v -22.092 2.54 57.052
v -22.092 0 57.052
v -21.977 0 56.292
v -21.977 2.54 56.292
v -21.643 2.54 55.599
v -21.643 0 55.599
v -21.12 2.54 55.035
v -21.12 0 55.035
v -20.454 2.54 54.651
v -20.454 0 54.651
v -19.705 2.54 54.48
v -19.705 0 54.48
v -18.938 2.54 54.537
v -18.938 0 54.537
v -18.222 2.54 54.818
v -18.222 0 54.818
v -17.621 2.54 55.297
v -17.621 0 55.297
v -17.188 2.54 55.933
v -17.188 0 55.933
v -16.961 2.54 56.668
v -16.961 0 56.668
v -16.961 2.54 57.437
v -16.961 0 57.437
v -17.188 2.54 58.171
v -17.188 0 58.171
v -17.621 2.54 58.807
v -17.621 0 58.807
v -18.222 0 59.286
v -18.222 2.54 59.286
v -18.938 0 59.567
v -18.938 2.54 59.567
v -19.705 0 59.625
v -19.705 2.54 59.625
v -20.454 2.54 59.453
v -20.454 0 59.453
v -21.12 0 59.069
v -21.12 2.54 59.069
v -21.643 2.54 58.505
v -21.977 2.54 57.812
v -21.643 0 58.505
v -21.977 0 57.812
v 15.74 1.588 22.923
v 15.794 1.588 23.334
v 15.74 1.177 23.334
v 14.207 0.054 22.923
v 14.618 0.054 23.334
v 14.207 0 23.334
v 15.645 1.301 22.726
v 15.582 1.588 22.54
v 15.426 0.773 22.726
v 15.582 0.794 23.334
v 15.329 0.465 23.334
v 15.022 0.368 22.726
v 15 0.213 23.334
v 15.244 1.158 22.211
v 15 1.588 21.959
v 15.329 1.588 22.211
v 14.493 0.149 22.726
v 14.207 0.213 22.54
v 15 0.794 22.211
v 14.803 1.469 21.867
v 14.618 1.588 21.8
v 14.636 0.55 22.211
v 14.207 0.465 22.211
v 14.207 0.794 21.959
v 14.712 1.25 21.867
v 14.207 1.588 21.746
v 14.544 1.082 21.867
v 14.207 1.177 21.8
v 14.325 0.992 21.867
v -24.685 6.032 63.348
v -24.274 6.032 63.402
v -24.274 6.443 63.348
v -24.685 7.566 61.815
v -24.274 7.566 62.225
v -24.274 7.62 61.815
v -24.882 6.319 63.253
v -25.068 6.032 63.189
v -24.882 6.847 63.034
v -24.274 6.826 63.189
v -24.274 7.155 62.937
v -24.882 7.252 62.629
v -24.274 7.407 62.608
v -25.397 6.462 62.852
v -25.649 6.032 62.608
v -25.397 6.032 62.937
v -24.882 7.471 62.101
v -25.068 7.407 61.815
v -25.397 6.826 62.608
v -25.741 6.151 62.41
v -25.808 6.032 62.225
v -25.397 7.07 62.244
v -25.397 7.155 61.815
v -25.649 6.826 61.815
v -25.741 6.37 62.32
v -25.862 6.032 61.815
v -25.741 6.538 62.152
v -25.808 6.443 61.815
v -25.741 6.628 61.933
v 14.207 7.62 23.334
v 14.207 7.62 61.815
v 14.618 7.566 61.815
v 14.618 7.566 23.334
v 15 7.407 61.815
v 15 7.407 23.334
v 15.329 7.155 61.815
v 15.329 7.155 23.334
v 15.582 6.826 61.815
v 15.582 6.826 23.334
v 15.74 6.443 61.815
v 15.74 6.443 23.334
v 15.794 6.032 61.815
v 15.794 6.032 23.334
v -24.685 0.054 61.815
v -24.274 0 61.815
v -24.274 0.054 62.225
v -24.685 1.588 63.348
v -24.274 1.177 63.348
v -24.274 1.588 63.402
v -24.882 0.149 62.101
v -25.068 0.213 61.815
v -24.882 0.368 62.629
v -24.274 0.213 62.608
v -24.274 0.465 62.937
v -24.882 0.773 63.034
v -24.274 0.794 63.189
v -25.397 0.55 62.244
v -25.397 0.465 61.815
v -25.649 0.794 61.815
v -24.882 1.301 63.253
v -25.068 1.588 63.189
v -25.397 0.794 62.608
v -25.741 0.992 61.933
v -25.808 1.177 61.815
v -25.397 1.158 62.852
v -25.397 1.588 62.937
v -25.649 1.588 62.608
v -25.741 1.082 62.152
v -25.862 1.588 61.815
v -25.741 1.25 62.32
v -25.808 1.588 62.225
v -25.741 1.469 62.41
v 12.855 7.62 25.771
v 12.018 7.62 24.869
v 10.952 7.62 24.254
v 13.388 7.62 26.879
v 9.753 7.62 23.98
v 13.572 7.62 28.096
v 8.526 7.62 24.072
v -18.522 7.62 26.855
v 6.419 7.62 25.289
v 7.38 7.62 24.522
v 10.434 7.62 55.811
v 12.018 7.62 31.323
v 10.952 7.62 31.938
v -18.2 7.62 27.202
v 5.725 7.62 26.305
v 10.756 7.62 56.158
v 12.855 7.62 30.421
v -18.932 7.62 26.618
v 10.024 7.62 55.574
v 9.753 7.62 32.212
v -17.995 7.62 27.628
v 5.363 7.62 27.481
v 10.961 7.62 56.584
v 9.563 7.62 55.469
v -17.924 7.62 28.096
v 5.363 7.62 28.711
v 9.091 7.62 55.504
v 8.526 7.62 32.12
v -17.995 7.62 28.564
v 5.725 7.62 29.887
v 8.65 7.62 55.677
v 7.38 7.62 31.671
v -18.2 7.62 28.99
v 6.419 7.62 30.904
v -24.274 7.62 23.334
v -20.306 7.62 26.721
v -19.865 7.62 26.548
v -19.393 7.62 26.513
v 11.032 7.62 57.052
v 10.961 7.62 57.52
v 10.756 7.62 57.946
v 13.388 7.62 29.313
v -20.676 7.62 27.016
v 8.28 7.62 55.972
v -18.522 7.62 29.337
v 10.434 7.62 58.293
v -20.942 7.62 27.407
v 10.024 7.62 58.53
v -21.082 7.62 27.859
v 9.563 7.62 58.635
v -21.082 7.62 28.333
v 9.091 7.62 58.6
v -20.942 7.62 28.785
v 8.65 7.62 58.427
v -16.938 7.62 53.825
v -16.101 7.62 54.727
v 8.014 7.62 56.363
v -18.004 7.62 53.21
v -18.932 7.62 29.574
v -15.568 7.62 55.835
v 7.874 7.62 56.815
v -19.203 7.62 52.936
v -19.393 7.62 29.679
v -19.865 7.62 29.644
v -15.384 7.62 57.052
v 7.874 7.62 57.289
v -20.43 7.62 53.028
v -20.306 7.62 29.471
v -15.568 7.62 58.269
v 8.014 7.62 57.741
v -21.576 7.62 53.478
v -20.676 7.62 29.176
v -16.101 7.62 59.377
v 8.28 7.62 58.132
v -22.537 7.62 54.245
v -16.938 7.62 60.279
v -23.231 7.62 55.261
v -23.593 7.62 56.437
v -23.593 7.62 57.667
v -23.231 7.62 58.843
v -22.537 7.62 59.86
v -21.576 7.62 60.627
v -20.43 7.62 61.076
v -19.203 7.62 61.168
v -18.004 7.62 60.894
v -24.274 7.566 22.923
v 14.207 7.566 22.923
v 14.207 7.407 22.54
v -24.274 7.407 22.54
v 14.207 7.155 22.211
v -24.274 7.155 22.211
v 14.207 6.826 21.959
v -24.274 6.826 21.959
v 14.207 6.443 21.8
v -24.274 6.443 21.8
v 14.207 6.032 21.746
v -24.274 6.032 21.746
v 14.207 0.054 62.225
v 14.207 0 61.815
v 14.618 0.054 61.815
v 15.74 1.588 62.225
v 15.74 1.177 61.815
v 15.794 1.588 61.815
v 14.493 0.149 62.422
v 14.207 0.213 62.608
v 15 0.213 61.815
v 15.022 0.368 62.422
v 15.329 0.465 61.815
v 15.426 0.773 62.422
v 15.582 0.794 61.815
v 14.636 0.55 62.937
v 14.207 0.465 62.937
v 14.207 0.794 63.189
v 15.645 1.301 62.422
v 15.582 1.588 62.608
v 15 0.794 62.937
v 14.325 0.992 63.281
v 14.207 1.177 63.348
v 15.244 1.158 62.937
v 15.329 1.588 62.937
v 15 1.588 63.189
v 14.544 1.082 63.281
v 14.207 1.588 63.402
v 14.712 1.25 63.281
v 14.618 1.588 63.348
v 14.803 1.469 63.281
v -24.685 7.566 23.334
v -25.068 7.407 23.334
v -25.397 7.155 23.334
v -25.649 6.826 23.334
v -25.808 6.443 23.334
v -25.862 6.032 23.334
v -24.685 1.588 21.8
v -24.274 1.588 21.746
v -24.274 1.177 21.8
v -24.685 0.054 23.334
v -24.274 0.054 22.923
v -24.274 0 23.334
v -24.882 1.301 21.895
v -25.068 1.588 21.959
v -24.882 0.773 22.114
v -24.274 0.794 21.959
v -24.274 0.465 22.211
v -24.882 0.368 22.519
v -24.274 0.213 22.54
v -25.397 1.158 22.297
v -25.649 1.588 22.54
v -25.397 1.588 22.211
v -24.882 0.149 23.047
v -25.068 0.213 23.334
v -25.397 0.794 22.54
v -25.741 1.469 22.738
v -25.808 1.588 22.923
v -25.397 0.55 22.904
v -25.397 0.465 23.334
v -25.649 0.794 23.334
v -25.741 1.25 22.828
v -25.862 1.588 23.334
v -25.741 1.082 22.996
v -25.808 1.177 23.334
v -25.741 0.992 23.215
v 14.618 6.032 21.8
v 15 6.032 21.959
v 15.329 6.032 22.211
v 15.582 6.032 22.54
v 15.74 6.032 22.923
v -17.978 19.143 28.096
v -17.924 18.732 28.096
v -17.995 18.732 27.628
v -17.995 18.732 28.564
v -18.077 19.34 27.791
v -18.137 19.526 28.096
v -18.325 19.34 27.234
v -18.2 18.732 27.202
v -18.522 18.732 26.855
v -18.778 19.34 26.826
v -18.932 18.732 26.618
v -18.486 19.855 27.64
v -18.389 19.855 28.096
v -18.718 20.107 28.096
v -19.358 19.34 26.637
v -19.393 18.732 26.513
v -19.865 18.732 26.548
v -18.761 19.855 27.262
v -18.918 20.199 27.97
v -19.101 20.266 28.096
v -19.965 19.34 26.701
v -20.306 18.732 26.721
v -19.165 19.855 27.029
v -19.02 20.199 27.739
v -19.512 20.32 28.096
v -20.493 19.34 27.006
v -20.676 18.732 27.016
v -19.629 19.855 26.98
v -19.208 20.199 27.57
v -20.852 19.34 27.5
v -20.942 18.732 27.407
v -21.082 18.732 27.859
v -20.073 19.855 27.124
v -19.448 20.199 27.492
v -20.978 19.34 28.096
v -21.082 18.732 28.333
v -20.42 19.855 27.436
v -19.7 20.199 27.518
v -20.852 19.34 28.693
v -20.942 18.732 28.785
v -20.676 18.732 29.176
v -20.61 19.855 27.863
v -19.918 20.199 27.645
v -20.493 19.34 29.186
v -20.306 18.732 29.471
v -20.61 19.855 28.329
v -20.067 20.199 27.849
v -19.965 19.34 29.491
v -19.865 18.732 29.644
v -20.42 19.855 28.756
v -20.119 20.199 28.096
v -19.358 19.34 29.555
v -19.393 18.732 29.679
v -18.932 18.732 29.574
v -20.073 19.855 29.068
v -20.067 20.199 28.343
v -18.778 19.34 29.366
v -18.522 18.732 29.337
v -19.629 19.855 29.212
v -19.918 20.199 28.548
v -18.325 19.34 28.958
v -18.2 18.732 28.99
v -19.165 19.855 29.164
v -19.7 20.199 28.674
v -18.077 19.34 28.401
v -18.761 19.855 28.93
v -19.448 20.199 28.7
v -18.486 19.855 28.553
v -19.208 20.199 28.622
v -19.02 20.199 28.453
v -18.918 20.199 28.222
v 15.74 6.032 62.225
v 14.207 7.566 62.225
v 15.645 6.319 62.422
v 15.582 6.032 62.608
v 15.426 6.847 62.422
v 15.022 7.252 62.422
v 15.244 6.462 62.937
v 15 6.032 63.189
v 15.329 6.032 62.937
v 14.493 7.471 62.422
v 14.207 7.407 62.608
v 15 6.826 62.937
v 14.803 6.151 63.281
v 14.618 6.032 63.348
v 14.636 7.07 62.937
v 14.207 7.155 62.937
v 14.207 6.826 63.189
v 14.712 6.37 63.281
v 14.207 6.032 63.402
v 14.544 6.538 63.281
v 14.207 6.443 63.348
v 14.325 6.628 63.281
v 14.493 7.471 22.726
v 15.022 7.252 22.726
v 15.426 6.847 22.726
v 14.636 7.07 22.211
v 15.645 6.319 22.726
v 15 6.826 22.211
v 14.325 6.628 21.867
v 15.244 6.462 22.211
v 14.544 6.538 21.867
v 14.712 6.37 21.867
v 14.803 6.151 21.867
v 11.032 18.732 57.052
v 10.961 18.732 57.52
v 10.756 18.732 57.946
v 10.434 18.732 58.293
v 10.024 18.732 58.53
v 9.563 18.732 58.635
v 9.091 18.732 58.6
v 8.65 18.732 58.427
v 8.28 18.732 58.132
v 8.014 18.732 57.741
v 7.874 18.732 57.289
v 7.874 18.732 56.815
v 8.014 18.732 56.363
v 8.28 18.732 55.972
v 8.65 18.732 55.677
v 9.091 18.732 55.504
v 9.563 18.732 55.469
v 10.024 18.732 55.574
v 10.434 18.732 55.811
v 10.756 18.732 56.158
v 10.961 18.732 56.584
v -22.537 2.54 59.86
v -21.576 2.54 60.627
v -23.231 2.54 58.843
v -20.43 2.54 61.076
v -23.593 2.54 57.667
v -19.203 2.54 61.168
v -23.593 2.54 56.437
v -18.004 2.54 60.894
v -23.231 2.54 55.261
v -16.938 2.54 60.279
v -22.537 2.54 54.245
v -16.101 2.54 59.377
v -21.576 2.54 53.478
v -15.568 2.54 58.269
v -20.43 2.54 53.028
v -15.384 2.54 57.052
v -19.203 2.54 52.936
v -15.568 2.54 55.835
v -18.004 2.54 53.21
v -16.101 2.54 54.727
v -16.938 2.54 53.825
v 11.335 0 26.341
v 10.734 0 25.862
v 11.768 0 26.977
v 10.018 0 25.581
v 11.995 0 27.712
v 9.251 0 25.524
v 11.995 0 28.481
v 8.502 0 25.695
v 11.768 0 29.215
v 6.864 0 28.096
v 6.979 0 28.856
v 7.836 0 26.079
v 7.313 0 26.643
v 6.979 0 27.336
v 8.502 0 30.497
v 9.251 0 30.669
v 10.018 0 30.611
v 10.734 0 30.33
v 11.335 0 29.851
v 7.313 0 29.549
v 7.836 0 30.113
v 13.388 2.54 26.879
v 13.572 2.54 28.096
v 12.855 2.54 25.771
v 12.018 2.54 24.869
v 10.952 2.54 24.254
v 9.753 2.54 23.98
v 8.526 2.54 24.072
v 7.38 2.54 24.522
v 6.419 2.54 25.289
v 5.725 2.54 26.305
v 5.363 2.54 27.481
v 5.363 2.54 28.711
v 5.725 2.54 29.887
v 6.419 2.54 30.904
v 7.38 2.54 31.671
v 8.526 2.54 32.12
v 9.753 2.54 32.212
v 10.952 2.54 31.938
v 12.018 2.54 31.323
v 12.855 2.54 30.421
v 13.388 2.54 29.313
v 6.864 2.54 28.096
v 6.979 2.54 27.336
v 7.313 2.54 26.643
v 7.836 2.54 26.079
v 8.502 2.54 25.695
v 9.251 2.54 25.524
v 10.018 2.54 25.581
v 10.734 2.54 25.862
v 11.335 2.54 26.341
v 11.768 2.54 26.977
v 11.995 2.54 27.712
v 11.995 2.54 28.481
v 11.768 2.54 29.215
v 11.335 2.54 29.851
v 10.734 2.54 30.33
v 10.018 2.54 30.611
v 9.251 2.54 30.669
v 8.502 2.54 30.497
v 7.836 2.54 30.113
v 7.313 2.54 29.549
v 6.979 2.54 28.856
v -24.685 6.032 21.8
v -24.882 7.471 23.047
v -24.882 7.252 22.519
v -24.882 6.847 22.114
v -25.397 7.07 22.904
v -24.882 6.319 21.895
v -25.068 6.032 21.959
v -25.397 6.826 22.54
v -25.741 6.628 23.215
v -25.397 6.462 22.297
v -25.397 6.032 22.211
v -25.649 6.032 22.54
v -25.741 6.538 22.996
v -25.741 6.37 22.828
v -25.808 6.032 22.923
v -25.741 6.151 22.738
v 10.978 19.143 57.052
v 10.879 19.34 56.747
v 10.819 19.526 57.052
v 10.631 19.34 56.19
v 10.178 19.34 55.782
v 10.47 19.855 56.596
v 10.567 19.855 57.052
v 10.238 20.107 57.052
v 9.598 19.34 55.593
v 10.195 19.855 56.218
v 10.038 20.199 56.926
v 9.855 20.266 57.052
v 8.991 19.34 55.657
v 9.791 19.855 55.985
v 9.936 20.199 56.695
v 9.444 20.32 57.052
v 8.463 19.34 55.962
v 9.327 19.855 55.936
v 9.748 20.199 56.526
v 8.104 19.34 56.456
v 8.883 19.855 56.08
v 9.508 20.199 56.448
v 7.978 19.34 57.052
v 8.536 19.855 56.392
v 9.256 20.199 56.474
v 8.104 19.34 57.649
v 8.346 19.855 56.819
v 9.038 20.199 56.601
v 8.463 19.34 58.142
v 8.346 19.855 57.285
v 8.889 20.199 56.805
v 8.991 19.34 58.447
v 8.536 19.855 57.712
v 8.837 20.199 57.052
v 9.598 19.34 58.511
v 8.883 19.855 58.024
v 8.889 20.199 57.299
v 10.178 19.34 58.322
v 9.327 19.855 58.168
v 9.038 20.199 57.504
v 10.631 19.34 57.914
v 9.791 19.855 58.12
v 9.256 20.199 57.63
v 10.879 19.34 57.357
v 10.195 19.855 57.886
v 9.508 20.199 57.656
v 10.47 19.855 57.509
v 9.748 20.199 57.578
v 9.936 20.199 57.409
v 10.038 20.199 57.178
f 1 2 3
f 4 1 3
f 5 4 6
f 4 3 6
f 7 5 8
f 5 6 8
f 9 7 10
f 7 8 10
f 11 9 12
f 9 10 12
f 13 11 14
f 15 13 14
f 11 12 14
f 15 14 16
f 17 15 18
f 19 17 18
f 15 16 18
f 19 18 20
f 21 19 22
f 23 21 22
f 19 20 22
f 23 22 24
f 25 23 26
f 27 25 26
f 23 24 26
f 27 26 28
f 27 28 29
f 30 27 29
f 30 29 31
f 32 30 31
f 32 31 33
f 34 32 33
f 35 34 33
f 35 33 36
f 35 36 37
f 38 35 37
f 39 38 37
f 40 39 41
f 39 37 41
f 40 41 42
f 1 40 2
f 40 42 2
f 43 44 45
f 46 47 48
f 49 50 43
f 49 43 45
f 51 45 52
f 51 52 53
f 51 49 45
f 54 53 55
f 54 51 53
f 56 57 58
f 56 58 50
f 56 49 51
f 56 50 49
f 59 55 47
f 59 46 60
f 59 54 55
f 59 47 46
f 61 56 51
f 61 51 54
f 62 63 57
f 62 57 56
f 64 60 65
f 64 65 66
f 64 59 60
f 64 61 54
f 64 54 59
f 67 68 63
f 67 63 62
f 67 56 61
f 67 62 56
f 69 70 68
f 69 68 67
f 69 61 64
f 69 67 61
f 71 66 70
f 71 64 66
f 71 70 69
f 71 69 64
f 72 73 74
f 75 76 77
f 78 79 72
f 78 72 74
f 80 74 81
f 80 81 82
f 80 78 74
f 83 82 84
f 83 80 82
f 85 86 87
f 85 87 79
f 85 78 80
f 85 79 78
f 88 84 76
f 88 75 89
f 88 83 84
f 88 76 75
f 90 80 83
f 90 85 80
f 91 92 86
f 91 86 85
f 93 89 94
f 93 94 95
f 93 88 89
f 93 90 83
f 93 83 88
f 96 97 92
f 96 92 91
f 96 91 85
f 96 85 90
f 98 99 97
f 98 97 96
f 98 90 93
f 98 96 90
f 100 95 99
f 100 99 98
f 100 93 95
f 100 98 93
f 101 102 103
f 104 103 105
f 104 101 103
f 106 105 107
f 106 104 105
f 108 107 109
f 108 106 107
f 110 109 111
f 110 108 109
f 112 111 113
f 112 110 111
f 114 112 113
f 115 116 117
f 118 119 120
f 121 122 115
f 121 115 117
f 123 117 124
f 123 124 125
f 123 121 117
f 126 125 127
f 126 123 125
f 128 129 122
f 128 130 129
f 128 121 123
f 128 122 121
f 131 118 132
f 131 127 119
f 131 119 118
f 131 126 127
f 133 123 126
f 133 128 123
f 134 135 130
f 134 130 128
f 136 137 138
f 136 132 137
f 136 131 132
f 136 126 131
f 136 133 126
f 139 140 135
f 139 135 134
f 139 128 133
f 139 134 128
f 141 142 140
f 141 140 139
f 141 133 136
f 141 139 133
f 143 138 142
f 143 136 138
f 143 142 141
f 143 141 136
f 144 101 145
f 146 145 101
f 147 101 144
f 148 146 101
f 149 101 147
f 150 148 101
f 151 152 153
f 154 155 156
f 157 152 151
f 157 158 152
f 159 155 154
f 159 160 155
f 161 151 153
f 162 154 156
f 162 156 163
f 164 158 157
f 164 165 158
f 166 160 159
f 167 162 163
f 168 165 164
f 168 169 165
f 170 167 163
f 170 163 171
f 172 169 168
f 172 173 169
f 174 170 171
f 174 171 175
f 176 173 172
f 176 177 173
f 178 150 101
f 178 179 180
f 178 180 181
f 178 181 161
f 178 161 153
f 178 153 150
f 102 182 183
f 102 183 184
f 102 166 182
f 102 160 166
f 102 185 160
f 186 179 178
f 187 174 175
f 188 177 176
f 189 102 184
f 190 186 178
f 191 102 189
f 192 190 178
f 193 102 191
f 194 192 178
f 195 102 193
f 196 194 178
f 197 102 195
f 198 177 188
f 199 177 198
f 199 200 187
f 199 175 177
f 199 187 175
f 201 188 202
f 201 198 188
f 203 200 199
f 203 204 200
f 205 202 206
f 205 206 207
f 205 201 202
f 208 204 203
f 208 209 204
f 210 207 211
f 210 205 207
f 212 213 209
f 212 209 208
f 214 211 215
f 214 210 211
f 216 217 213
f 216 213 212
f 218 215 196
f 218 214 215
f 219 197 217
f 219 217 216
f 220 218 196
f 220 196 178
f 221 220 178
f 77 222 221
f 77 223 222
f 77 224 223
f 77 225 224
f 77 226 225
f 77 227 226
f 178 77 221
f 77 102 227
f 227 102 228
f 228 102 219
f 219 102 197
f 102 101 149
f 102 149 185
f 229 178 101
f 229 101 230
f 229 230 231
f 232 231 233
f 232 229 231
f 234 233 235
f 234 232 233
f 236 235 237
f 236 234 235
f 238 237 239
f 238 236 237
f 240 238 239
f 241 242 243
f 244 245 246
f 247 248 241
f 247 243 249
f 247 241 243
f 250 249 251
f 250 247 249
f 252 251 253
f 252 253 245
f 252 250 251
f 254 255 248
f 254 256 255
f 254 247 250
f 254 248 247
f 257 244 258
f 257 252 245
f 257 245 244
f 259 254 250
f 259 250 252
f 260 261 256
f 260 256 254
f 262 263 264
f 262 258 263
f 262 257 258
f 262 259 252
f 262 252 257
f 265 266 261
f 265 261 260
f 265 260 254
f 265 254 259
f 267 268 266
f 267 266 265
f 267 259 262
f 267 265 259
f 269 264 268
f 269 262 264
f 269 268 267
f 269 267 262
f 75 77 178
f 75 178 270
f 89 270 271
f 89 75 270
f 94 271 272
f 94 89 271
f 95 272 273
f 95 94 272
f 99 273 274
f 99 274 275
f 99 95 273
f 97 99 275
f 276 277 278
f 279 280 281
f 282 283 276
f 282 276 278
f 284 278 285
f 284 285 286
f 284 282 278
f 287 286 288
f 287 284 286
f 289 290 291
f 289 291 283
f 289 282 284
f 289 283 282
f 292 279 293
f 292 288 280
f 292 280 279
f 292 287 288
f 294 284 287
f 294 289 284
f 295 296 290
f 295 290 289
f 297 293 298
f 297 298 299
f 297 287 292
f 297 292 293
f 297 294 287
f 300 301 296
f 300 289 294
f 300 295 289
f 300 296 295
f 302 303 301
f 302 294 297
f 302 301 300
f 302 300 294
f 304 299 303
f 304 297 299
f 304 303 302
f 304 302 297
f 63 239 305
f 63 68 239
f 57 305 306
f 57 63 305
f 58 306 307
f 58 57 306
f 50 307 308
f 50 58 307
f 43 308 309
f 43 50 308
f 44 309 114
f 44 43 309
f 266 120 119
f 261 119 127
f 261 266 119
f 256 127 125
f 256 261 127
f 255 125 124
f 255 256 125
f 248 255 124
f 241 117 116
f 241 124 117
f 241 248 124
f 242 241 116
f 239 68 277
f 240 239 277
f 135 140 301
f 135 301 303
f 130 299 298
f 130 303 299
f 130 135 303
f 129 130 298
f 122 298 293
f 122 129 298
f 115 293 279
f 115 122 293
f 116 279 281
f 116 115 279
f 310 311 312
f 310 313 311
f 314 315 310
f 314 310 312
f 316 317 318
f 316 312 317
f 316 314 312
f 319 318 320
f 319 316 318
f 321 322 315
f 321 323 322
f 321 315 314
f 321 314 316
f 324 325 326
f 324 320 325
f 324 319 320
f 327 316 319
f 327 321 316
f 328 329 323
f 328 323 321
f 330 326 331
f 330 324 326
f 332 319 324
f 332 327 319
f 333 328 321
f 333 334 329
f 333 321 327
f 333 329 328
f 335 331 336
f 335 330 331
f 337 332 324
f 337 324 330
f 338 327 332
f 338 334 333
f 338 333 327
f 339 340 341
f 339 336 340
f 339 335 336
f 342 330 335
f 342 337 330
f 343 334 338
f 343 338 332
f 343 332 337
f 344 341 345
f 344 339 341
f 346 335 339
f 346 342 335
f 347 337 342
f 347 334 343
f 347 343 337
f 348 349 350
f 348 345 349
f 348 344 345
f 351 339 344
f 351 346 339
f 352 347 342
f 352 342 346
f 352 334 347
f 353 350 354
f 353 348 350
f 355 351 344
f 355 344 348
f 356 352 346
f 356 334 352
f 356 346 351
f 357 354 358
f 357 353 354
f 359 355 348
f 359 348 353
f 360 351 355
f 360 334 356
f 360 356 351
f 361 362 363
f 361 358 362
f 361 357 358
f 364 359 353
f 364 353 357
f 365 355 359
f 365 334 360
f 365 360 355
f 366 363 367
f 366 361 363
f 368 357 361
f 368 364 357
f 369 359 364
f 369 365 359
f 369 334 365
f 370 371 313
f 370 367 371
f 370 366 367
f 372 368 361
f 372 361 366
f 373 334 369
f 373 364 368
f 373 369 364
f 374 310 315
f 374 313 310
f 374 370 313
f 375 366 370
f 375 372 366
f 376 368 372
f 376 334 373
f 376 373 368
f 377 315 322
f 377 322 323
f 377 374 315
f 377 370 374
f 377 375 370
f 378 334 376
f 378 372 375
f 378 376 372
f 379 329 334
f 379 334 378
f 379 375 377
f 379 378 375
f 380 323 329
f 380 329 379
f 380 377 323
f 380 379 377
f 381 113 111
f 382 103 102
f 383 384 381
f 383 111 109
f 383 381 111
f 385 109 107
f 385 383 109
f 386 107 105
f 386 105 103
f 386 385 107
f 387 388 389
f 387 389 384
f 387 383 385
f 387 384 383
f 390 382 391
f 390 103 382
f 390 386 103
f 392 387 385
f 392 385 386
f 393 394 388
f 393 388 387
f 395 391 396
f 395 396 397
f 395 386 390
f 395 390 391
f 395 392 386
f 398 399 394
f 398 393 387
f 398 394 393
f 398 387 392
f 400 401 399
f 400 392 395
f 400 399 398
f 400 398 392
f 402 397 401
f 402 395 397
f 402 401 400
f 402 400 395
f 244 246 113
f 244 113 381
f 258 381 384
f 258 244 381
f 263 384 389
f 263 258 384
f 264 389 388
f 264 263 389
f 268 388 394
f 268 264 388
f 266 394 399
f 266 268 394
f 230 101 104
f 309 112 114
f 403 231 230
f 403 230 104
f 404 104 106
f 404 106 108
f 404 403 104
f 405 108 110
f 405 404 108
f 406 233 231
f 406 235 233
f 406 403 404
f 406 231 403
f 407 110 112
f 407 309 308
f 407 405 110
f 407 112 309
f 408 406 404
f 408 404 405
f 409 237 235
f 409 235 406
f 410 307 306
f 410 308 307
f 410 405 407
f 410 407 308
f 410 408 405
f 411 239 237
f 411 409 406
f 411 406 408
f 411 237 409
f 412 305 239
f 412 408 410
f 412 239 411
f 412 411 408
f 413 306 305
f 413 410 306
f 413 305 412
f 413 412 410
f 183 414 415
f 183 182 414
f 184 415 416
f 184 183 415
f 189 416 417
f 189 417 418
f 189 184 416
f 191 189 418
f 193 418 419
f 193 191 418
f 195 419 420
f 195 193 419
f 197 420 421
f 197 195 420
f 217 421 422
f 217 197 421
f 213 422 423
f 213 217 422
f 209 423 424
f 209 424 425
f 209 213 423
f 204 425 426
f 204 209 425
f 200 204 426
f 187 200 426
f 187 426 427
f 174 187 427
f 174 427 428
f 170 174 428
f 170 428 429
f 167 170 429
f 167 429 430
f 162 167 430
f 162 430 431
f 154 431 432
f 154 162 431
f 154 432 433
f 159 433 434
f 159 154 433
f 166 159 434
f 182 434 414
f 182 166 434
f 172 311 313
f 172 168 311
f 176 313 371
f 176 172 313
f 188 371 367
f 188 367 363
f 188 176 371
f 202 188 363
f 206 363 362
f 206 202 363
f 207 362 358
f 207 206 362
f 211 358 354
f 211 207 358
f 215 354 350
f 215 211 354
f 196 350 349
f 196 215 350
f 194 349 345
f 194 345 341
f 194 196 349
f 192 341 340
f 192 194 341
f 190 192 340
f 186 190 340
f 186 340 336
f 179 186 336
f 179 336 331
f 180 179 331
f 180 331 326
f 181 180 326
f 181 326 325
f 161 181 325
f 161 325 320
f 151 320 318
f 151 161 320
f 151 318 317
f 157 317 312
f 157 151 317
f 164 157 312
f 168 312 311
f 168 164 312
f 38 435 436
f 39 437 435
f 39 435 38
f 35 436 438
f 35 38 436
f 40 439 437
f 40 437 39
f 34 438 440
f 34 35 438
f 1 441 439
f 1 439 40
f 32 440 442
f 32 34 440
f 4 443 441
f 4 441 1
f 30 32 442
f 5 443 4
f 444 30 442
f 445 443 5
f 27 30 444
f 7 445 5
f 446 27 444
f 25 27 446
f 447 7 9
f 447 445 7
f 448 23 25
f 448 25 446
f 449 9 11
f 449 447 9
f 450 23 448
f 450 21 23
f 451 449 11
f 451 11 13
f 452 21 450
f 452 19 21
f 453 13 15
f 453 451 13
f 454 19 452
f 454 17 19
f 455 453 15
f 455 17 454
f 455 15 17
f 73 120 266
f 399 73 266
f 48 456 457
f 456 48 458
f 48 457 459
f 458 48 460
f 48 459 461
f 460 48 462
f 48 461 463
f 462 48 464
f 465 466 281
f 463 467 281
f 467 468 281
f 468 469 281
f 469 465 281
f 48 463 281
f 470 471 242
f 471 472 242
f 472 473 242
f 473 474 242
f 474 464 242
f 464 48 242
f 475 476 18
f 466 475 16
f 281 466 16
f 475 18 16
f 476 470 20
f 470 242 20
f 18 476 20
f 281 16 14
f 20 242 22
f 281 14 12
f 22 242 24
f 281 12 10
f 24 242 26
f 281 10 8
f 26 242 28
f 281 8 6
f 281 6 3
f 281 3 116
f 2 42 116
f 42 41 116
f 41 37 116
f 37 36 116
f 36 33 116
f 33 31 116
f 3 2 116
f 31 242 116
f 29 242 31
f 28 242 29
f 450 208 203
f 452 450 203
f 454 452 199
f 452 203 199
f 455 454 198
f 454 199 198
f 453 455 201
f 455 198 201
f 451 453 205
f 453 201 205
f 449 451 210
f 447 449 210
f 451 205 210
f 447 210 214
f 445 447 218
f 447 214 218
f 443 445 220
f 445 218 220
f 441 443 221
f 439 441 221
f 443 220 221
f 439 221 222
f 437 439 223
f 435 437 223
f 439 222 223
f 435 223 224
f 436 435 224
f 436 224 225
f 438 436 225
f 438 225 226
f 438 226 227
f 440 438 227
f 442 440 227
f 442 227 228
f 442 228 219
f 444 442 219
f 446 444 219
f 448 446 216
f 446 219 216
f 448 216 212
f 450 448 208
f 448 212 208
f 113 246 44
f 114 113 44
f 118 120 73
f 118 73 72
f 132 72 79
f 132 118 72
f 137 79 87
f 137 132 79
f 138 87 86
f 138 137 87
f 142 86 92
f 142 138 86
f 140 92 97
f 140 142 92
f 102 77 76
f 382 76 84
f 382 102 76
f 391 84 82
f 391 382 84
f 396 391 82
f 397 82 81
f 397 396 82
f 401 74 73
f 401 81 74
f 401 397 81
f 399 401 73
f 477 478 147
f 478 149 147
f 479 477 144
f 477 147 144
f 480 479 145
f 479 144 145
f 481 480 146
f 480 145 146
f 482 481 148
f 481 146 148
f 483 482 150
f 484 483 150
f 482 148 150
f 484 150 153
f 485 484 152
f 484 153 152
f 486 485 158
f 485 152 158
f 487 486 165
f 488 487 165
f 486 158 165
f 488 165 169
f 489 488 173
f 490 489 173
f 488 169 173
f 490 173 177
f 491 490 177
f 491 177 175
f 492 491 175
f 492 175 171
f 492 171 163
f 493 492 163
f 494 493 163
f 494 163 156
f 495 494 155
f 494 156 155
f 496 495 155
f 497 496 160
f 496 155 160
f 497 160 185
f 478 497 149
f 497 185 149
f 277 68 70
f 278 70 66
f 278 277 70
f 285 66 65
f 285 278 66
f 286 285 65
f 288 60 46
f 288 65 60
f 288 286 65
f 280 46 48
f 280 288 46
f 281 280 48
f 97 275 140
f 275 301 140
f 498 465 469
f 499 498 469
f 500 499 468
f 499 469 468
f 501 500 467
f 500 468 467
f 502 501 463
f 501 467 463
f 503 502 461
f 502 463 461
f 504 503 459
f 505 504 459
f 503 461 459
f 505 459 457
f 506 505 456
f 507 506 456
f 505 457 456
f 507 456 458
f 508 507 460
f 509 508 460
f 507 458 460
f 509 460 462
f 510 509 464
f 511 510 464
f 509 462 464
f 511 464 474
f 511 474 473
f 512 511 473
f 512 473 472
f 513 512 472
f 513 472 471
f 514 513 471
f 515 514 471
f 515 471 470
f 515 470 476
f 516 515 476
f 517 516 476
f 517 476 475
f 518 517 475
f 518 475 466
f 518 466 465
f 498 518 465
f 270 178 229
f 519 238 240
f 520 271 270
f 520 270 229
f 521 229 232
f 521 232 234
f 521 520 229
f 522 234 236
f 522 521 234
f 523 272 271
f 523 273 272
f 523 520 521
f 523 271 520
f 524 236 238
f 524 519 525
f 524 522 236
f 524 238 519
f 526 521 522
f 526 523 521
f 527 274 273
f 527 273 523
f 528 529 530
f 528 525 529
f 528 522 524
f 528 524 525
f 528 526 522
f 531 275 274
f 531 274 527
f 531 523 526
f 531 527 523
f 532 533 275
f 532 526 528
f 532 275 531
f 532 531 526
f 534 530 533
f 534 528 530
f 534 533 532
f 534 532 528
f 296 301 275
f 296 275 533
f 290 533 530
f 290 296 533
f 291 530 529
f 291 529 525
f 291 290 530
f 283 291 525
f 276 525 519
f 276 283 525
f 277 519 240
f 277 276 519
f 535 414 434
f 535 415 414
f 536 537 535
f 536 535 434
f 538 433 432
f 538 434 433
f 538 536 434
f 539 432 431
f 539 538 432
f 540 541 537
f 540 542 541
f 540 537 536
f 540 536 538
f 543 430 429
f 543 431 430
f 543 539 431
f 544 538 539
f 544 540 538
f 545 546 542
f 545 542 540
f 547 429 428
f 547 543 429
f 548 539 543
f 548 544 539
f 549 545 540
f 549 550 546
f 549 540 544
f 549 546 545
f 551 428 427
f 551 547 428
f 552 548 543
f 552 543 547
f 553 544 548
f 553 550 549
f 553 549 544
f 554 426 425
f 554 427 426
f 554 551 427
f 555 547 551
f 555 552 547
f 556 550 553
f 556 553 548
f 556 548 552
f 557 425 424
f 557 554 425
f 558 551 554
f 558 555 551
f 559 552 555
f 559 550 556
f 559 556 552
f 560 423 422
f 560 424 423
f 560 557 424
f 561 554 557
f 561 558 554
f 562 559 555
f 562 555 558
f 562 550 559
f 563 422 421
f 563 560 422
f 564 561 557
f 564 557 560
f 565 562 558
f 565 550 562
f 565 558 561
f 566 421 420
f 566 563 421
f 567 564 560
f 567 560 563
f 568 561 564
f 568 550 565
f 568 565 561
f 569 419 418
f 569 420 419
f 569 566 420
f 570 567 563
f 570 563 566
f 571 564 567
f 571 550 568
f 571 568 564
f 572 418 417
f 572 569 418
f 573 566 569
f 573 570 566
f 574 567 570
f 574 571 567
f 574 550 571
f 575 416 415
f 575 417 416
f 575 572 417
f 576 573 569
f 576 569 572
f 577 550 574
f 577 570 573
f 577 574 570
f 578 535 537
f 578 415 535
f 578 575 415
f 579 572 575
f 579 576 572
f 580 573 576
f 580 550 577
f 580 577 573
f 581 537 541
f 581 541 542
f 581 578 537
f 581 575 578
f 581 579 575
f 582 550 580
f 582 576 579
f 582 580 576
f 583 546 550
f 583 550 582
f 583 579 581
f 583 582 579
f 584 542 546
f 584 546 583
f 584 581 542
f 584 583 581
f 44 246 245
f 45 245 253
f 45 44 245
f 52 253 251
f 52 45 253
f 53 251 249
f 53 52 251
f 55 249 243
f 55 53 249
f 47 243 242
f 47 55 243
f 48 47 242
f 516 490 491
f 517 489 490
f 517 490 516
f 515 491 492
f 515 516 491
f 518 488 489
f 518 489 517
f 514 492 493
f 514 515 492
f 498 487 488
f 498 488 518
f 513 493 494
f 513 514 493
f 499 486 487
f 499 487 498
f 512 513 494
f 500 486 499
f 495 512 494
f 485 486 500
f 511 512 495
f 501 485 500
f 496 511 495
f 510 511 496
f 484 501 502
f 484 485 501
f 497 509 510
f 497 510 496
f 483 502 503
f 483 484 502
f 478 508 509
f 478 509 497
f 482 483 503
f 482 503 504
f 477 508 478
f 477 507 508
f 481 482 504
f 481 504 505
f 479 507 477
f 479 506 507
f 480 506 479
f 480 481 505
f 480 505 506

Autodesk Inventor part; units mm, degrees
ref_plane "YZ Plane" through (0, 0, 0) normal (1, 0, 0) x (0, 1, 0)
ref_plane "XZ Plane" through (0, 0, 0) normal (0, 1, 0) x (-1, 0, 0)
ref_plane "XY Plane" through (0, 0, 0) normal (0, 0, 1) x (1, 0, 0)
sketch "Sketch1" plane through (0, 0, 0) normal (0, 1, 0) x (-1, 0, 0)
  circle A0 centre (19.5118, 57.0521) radius 2.5797
  circle A1 centre (19.5118, 28.0961) radius 1.5875
  circle A2 centre (-9.4442, 28.0961) radius 2.5797
  circle A3 centre (-9.4442, 57.0521) radius 1.5875
  line L0 (25.8618, 63.4021) -> (-15.7942, 63.4021)
  line L1 (-15.7942, 63.4021) -> (-15.7942, 21.7461)
  line L2 (-15.7942, 21.7461) -> (25.8618, 21.7461)
  line L3 (25.8618, 21.7461) -> (25.8618, 63.4021)
  point P0 (0, 0)
  dimension "d0" = 5.1594
  dimension "d1" = 3.175
  dimension "d2" = 28.956
  dimension "d3" = 5.1594
  dimension "d4" = 3.175
  dimension "d5" = 28.956
  dimension "d6" = 28.956
  dimension "d7" = 28.956
  dimension "d8" = 41.656
  dimension "d9" = 41.656
  dimension "d10" = 6.35
  dimension "d11" = 6.35
extrude "Extrusion1" add sketch "Sketch1" along normal blind 7.62
sketch "Sketch2" plane through (0, 7.62, 0) normal (0, 1, 0) x (1, 0, 0)
  circle A0 centre (-19.5118, -57.0521) radius 2.5797 projected
  circle A1 centre (-19.5118, -57.0521) radius 4.1275
  circle A2 centre (9.4442, -28.0961) radius 2.5797 projected
  circle A3 centre (9.4442, -28.0961) radius 4.1275
  point P0 (0, 0)
  dimension "d14" = 8.255
  dimension "d15" = 8.255
extrude "Extrusion2" cut sketch "Sketch2" against normal blind 5.08 contours A0 | A1 | A2 | A3
sketch "Sketch3" plane through (0, 0, 0) normal (0, -1, 0) x (1, 0, 0)
  circle A0 centre (-19.5118, 28.0961) radius 1.5875 projected
  circle A1 centre (-19.5118, 28.0961) radius 1.5875
  circle A2 centre (9.4442, 57.0521) radius 1.5875 projected
  circle A3 centre (9.4442, 57.0521) radius 1.5875
  point P0 (0, 0)
extrude "Extrusion3" add sketch "Sketch3" against normal blind 20.32
fillet "Fillet1" radius 1.5875 8 edges at (-25.8618, 7.62, 42.5741) (-5.0338, 7.62, 21.7461) (15.7942, 7.62, 42.5741) (-5.0338, 7.62, 63.4021) (-5.0338, 0, 63.4021) (-25.8618, 0, 42.5741) (-5.0338, 0, 21.7461) (15.7942, 0, 42.5741)
fillet "Fillet2" radius 1.5875 2 edges at (7.8567, 20.32, 57.0521) (-21.0993, 20.32, 28.0961)
fillet "Fillet3" radius 1.5875 12 edges at (15.3292, 7.155, 62.9372) (15.3292, 0.465, 62.9372) (15.7942, 3.81, 63.4021) (15.3292, 7.155, 22.2111) (15.3292, 0.465, 22.2111) (15.7942, 3.81, 21.7461) (-25.3968, 7.155, 22.2111) (-25.3968, 0.465, 22.2111) (-25.8618, 3.81, 21.7461) (-25.3968, 7.155, 62.9372) (-25.3968, 0.465, 62.9372) (-25.8618, 3.81, 63.4021)
properties part number "pigeon Mount"
